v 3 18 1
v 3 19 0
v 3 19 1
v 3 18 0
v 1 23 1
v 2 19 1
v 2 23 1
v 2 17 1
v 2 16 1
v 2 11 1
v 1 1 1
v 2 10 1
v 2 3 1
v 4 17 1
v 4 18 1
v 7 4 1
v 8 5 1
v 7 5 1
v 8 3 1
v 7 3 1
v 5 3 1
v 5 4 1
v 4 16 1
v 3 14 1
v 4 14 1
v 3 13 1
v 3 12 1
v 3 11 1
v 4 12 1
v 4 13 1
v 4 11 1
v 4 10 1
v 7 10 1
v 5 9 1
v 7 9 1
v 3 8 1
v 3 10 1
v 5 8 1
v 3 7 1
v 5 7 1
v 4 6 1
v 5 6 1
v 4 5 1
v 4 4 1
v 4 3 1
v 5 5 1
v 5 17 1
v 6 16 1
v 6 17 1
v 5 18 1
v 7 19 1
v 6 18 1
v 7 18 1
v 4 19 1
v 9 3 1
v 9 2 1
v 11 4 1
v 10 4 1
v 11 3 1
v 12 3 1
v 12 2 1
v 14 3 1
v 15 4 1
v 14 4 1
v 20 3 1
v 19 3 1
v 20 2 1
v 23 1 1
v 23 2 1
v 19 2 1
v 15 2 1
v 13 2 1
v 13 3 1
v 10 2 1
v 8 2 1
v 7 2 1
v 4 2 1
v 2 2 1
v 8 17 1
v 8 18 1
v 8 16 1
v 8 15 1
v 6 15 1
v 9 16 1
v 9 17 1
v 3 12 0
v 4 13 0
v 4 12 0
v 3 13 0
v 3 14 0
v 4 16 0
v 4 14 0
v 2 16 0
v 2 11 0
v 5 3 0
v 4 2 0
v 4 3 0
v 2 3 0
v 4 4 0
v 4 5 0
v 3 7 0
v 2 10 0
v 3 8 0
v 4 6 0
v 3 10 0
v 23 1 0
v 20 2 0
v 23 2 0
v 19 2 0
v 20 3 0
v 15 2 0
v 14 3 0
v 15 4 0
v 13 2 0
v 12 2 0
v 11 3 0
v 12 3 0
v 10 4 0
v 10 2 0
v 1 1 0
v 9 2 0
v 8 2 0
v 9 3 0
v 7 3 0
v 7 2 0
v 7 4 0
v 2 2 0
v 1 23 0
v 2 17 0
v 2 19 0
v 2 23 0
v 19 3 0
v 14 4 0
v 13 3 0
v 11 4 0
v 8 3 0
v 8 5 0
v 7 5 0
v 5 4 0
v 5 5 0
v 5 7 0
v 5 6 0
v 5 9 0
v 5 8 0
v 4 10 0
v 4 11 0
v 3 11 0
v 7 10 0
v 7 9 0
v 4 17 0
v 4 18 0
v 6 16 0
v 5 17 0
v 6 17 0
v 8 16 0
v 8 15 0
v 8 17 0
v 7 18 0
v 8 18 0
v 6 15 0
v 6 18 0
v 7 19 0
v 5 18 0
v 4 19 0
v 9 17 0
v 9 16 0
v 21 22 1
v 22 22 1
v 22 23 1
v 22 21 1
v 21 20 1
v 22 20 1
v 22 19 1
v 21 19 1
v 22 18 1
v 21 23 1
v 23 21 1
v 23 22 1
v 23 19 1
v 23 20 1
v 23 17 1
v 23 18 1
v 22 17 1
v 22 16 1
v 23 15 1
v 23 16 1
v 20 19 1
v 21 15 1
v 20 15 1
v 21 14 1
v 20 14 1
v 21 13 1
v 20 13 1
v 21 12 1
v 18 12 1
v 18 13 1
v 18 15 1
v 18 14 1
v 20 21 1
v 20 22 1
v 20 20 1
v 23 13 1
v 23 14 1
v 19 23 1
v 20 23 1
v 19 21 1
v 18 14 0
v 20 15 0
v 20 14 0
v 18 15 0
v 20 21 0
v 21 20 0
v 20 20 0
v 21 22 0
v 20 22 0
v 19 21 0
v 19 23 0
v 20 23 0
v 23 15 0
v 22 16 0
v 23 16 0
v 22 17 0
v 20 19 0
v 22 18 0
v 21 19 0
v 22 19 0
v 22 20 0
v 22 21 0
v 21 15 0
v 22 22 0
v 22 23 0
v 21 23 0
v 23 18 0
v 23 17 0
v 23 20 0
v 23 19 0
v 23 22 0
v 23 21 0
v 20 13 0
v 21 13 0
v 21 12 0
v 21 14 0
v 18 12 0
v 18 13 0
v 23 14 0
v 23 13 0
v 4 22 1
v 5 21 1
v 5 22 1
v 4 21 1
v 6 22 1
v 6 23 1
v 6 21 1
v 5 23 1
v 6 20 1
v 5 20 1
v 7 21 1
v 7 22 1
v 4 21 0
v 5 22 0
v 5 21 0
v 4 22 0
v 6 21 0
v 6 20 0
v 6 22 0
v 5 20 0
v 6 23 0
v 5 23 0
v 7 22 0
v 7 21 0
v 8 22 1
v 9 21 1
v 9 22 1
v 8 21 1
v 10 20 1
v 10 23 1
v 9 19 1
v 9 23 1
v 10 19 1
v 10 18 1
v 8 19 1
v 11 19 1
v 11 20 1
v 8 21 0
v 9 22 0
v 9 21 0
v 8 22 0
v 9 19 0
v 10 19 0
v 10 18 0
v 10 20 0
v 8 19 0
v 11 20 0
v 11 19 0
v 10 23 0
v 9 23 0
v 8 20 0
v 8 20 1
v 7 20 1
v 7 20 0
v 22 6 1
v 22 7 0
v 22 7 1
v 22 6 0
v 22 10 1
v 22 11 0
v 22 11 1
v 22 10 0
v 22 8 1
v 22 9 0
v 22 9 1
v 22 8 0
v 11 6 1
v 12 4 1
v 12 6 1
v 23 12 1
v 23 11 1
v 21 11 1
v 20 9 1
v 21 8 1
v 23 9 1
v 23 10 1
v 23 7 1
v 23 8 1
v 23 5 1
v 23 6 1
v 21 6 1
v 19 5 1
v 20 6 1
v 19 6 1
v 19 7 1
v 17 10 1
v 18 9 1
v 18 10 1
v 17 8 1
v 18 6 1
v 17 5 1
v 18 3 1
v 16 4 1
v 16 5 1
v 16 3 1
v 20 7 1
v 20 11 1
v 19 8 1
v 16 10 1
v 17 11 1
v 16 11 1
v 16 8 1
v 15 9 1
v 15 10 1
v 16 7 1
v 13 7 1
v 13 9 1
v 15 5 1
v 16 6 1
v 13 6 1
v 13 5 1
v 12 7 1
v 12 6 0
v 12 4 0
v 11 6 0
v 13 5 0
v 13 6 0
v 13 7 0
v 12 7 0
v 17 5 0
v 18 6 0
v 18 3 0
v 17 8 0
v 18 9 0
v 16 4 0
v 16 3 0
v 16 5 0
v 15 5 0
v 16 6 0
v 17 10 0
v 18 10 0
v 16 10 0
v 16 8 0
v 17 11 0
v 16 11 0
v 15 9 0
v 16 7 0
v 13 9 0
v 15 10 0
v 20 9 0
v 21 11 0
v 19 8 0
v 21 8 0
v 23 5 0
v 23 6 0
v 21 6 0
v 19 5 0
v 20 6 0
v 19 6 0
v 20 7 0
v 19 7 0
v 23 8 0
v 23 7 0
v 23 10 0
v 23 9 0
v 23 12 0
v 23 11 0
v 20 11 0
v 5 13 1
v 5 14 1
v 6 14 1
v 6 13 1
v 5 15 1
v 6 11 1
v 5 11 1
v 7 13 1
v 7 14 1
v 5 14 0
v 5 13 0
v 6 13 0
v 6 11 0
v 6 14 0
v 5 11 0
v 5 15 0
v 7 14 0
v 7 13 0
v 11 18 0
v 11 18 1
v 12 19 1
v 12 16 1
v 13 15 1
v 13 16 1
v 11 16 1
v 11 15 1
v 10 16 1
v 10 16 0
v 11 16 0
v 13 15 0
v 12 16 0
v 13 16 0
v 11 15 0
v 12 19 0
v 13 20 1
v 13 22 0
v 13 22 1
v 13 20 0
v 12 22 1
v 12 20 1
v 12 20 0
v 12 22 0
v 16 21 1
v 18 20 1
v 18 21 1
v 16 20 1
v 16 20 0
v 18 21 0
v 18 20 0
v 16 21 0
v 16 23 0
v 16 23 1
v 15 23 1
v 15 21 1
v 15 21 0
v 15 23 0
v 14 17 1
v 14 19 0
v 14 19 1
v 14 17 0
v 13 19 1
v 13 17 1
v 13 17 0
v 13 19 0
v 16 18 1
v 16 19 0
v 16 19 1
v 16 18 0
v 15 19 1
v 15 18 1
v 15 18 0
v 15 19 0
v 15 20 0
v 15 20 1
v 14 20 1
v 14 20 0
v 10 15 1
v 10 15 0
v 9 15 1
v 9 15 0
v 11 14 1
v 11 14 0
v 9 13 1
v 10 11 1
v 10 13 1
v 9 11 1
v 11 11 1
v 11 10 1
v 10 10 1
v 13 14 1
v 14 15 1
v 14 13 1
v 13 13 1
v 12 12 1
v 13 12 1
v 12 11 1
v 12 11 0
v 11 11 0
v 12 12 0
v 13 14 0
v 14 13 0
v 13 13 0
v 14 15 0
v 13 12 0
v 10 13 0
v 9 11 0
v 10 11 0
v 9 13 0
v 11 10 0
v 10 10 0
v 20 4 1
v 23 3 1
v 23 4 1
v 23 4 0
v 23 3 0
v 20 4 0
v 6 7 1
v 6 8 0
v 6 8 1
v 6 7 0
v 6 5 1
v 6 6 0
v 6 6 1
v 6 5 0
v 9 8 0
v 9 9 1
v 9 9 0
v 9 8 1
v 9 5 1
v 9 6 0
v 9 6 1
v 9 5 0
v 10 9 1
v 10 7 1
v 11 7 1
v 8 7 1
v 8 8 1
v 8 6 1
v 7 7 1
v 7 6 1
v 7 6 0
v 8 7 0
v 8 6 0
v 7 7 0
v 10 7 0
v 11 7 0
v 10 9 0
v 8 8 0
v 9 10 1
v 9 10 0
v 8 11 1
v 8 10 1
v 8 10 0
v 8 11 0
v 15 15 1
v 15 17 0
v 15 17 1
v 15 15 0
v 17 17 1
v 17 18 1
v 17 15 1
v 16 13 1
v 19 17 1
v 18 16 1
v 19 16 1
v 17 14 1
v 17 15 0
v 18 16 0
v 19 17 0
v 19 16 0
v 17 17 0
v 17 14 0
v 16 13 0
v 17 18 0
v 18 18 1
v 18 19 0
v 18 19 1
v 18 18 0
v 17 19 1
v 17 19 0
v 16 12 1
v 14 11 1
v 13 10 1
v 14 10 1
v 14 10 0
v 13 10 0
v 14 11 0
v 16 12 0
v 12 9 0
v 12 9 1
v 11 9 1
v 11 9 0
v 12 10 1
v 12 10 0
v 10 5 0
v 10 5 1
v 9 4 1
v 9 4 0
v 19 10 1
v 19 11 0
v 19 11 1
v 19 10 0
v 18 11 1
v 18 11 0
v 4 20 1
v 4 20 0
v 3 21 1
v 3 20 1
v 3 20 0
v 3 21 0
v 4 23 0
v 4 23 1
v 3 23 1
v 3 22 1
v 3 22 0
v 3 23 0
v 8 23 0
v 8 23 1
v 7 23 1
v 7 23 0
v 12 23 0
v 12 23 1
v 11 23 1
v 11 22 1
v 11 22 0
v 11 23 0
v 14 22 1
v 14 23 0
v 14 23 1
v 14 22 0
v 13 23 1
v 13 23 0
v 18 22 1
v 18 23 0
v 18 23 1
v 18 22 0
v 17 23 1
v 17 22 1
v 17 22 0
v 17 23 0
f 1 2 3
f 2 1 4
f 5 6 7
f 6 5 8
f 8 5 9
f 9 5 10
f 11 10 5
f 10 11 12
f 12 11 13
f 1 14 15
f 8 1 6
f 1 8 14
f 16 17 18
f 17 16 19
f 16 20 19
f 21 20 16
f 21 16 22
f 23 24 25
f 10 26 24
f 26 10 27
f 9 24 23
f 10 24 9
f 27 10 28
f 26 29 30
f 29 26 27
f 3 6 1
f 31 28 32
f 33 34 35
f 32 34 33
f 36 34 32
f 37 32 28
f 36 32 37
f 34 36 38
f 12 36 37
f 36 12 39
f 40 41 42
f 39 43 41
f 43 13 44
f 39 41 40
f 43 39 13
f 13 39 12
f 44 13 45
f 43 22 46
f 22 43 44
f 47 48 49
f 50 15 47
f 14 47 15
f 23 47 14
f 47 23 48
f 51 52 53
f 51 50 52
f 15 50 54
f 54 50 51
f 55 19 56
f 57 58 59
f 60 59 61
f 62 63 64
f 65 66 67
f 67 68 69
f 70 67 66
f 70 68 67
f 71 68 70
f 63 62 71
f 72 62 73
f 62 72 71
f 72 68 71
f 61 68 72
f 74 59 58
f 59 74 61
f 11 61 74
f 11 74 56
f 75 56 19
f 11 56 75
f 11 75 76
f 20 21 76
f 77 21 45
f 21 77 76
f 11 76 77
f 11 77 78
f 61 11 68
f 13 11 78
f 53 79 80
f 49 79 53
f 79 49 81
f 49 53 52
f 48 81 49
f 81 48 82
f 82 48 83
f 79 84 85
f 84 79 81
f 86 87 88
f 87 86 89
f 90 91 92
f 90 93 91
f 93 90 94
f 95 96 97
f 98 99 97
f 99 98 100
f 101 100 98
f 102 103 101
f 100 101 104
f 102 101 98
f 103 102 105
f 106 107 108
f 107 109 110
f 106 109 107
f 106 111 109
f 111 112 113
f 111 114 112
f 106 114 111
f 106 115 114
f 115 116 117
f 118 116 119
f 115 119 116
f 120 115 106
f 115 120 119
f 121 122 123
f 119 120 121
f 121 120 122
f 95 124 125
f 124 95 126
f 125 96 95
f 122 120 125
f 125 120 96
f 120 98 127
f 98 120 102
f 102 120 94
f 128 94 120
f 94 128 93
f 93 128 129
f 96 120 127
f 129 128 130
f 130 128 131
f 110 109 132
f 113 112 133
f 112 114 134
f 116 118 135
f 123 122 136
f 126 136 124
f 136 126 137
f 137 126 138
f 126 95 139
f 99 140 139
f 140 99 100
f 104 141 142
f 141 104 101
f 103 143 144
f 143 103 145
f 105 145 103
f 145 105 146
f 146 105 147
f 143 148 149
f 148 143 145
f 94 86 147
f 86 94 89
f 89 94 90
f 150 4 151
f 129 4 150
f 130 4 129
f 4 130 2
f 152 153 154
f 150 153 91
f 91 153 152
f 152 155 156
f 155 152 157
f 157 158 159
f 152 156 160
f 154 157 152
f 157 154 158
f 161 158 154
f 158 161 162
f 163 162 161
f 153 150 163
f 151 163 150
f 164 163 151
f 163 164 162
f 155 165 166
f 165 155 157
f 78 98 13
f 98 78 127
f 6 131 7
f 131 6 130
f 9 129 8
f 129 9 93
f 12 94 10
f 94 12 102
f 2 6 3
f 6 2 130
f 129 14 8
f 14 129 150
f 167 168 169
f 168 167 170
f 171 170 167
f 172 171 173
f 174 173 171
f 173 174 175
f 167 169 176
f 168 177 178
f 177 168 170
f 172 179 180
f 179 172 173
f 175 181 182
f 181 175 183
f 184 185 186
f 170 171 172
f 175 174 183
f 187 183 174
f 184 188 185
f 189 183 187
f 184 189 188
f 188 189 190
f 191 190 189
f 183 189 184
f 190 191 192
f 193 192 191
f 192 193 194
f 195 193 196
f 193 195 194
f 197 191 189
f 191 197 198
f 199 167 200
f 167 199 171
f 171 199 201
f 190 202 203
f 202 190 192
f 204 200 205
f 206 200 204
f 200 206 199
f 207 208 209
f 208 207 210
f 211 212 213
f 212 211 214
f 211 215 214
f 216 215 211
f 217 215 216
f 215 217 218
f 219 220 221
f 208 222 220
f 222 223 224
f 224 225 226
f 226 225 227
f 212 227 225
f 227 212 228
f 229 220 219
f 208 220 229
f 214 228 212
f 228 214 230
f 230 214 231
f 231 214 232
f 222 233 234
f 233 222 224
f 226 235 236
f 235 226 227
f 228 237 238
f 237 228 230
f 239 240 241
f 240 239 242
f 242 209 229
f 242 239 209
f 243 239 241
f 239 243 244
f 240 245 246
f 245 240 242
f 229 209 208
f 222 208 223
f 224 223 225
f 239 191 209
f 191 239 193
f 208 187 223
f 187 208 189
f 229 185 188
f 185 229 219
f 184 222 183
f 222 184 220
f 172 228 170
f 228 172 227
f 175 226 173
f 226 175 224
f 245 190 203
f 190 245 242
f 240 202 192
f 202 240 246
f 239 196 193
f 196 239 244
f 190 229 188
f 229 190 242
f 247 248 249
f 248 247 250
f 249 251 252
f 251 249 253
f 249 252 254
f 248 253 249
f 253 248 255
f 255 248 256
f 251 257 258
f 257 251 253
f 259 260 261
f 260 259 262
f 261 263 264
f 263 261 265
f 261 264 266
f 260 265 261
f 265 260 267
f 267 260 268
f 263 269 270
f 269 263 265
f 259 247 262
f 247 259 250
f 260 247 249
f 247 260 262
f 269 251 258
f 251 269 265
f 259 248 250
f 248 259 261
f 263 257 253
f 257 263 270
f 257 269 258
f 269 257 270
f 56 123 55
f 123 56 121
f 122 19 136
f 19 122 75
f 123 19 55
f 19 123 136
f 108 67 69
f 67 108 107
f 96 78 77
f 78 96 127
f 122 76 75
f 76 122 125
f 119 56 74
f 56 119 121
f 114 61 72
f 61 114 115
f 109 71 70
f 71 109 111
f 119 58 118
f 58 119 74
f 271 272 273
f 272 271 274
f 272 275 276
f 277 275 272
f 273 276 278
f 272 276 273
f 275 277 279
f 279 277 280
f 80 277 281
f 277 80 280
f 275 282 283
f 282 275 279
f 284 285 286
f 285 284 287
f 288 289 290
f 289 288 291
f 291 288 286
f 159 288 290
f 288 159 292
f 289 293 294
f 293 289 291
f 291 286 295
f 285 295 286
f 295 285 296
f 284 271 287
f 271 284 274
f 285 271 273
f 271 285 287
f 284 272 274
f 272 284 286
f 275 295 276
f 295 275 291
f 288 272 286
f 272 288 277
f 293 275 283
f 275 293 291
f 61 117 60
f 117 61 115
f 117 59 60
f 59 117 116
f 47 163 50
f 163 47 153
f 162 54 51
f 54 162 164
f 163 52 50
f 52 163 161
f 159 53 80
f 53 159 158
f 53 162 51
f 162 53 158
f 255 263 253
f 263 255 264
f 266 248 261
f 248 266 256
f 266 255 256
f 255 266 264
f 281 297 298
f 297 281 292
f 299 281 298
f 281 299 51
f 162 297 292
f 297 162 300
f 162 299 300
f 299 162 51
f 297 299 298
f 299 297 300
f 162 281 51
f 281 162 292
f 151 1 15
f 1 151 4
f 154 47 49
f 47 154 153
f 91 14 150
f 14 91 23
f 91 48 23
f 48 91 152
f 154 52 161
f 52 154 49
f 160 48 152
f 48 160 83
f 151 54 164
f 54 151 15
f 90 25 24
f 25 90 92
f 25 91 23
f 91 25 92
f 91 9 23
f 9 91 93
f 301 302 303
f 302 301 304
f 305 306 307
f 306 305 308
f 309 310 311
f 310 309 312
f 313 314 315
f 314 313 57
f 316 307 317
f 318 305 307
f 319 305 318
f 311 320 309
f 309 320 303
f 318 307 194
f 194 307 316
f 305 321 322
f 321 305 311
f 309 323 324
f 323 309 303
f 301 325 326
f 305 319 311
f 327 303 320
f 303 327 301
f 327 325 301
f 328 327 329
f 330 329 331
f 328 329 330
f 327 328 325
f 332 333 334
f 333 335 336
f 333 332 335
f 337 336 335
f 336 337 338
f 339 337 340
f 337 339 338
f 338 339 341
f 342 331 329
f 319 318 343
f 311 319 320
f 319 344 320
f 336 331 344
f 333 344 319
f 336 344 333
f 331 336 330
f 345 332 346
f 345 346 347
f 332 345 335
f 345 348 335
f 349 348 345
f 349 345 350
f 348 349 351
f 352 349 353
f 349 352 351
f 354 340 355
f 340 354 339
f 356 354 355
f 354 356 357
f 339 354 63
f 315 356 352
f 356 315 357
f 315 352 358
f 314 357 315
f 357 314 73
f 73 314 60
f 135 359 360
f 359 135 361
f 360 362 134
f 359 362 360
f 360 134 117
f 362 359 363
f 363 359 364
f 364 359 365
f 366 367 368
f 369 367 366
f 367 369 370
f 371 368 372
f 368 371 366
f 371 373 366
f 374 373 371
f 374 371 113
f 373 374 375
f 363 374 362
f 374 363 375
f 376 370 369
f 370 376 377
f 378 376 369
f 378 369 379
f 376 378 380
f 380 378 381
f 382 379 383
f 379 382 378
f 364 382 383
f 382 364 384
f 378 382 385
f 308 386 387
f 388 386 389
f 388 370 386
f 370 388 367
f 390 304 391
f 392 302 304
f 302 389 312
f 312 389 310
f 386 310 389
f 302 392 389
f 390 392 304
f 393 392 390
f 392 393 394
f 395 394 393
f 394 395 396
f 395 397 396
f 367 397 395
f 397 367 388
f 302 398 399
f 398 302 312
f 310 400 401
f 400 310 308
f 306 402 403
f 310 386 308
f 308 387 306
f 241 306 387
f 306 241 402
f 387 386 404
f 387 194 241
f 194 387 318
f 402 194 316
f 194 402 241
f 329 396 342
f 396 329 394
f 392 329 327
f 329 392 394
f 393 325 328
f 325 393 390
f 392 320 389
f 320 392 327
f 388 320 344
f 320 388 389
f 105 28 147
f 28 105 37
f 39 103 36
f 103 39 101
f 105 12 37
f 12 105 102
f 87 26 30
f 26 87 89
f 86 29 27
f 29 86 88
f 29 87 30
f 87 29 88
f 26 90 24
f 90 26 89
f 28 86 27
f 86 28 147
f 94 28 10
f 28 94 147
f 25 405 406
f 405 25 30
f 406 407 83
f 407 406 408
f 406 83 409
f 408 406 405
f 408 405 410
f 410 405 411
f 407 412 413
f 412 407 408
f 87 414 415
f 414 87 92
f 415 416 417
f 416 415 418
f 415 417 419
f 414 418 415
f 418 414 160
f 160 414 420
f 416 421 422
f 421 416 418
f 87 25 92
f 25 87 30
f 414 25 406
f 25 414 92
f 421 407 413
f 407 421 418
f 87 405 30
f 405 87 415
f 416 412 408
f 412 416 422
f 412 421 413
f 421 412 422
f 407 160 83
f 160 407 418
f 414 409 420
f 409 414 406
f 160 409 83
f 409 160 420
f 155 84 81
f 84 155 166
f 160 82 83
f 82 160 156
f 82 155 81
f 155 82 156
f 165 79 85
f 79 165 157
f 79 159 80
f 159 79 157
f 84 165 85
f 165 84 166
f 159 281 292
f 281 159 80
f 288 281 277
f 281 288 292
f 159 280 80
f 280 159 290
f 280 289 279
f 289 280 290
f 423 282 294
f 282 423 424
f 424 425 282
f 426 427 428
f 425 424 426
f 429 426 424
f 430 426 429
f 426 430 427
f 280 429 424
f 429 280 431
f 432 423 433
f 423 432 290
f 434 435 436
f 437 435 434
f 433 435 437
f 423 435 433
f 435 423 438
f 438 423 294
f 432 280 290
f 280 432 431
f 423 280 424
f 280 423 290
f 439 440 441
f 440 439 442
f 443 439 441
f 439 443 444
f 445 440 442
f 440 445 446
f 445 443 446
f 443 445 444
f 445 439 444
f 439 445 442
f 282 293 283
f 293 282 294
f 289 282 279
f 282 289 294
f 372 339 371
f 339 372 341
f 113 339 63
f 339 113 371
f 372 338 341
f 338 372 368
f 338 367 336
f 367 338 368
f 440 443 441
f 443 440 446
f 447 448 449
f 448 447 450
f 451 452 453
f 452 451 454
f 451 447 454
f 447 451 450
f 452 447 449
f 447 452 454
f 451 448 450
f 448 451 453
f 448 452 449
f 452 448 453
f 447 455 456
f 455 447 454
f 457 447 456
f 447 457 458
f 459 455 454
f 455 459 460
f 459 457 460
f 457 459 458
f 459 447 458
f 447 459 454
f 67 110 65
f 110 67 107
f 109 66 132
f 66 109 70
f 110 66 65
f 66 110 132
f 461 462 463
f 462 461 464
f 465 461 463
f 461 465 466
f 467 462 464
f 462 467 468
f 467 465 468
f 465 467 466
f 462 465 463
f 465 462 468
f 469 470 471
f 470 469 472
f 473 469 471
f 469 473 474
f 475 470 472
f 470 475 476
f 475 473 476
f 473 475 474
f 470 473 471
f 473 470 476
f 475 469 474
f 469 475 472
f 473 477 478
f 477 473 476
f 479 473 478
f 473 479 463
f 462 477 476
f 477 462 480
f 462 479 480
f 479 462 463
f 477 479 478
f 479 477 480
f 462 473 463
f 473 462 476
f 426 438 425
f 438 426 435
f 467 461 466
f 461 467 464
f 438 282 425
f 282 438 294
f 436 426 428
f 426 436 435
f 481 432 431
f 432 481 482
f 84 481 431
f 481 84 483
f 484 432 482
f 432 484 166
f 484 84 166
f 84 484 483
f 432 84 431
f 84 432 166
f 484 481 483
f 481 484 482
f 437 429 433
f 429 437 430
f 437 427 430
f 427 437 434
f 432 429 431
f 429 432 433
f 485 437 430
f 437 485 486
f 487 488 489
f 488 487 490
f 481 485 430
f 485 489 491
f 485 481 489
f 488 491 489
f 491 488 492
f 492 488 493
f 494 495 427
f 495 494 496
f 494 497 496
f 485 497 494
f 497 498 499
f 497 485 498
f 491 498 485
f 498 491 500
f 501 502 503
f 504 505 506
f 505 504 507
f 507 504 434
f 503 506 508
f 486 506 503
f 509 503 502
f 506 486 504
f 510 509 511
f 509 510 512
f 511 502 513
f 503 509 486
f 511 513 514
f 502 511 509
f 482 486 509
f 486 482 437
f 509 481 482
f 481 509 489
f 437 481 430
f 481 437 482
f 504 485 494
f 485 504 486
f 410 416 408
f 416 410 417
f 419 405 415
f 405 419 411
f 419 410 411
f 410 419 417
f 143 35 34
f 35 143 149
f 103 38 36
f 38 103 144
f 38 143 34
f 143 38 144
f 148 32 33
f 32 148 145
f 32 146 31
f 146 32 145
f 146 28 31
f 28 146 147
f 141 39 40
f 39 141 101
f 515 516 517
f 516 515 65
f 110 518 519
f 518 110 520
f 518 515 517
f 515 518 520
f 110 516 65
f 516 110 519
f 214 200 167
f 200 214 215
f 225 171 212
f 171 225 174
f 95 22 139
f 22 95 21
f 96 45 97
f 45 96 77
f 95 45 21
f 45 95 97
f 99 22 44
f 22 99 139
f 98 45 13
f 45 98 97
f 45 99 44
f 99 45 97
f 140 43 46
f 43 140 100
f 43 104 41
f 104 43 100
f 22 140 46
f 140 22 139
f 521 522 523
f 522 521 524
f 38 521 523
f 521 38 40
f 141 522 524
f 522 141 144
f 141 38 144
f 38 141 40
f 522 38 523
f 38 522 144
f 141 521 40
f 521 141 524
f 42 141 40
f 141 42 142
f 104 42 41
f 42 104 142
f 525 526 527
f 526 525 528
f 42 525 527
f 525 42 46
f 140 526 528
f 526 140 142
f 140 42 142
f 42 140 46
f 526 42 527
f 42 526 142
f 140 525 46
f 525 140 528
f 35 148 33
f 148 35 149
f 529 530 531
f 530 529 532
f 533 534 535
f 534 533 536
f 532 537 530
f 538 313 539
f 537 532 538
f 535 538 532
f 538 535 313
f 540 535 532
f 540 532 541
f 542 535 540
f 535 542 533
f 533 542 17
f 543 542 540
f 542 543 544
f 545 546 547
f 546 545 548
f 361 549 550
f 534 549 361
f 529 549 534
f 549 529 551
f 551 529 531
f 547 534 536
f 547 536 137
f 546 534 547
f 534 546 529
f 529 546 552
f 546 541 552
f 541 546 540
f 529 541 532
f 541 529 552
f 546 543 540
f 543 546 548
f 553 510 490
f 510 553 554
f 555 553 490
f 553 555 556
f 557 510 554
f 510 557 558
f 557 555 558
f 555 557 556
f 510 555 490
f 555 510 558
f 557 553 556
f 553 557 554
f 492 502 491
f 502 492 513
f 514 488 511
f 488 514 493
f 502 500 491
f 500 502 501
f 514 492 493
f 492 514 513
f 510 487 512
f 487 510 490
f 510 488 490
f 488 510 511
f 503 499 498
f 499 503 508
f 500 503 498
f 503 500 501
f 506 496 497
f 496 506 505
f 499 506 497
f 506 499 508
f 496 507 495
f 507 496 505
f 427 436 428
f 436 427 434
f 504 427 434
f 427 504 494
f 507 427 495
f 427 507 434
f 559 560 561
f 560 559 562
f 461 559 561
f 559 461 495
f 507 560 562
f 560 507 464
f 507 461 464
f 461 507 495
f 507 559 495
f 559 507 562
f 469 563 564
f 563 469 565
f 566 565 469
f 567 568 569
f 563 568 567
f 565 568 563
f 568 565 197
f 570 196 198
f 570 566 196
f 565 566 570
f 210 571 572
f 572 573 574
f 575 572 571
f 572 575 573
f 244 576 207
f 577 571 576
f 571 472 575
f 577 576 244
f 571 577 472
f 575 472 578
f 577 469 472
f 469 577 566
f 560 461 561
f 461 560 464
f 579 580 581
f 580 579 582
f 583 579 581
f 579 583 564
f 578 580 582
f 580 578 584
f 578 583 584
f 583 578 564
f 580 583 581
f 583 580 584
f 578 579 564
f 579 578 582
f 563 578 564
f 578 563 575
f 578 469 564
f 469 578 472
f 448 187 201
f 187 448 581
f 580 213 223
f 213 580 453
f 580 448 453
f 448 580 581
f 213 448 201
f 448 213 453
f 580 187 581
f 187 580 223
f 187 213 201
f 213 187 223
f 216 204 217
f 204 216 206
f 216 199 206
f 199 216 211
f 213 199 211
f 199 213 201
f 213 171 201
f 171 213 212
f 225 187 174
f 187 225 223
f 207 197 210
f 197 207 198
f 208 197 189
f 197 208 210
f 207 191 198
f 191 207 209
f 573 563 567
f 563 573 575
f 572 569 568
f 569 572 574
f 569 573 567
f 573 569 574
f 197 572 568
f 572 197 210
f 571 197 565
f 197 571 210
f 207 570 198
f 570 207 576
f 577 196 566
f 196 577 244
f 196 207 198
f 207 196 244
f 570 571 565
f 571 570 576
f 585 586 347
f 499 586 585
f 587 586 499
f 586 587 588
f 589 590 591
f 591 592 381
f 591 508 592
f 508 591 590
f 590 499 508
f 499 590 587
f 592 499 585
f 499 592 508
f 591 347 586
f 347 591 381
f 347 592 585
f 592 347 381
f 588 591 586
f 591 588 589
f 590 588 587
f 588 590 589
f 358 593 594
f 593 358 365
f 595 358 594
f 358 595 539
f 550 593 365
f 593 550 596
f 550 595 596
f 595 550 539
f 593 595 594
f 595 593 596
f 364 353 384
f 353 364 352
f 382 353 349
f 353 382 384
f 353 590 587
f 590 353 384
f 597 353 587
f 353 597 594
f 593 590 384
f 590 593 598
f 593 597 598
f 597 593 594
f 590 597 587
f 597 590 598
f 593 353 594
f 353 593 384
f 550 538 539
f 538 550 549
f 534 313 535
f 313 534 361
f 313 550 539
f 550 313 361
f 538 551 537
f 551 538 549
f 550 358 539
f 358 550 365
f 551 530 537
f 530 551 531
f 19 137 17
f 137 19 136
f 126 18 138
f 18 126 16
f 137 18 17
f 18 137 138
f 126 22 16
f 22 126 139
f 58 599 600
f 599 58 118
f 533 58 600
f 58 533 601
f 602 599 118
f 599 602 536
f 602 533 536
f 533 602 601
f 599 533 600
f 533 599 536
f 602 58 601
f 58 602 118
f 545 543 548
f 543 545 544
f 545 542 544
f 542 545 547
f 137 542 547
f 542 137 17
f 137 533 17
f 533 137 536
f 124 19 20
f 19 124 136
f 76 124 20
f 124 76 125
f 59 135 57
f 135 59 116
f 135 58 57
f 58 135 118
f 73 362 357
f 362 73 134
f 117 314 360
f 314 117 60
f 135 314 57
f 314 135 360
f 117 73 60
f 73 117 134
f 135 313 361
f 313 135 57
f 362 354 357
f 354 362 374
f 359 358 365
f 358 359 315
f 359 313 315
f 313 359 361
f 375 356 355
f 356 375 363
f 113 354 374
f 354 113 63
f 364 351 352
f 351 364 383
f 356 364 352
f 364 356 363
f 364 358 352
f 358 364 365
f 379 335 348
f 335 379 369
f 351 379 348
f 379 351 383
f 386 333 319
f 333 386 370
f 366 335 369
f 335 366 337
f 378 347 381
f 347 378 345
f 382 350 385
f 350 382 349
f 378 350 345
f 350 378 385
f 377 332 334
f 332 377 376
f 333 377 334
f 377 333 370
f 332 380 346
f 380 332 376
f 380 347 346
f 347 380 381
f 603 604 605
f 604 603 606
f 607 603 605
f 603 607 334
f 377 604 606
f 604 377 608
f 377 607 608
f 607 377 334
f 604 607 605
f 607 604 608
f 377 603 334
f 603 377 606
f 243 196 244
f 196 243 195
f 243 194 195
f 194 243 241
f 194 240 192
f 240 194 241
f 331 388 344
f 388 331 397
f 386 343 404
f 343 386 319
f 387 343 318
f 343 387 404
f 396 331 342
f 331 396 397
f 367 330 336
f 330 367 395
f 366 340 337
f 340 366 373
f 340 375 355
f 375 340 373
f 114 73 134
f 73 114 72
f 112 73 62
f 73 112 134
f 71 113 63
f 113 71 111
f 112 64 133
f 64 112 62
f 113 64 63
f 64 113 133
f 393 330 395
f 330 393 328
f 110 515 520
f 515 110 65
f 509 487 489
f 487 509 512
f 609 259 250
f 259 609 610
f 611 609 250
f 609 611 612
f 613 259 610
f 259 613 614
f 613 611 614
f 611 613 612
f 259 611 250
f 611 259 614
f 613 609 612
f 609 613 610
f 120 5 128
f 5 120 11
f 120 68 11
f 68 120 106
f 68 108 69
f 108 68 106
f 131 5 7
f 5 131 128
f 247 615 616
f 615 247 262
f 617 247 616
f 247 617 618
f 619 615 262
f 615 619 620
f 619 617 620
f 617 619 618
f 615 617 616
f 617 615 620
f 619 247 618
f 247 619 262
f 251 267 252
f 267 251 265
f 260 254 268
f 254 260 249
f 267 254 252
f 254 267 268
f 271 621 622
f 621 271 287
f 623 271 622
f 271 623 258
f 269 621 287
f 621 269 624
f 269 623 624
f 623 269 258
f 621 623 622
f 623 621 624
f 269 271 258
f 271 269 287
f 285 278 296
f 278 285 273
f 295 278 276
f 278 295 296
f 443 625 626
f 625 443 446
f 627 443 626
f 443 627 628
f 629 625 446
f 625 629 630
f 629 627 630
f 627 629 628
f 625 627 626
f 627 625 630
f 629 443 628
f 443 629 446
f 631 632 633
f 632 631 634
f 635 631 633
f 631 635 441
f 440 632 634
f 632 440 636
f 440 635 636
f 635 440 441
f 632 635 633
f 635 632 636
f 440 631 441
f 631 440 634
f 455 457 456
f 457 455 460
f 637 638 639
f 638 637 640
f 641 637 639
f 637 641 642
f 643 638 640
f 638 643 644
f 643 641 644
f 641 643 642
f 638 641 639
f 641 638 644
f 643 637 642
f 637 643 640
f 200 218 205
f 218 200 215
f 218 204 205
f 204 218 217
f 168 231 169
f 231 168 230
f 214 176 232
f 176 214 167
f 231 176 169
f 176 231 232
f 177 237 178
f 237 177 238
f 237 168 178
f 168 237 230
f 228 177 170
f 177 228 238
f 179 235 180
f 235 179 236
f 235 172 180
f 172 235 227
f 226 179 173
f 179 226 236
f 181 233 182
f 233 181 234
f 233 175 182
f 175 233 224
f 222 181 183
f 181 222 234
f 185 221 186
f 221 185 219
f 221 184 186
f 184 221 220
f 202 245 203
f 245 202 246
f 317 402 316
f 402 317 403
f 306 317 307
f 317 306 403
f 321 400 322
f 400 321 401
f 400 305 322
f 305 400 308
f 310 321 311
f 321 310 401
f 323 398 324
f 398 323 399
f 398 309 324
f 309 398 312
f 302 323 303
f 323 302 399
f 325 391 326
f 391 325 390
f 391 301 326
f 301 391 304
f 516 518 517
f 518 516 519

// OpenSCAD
// file: ../../util/bitmap.scad
/*****************************************************************************
 * Module Bitmap Library
 * Modules to create bitmaps of unit squares from 1 or 2 dimensional vectors.
 *****************************************************************************
 * Copyright 2017 Chris Baker
 *
 * This program is free software: you can redistribute it and/or modify
 * it under the terms of the GNU Lesser General Public License as published by
 * the Free Software Foundation, either version 3 of the License, or
 * (at your option) any later version.
 *
 * This program is distributed in the hope that it will be useful,
 * but WITHOUT ANY WARRANTY; without even the implied warranty of
 * MERCHANTABILITY or FITNESS FOR A PARTICULAR PURPOSE.  See the
 * GNU Lesser General Public License for more details.
 *
 * You should have received a copy of the GNU Lesser General Public License
 * along with this program.  If not, see <http://www.gnu.org/licenses/>.
 *****************************************************************************
 * Usage:
 * Include this file with the "use" tag.
 * Depends on compat.scad library.
 *
 * API:
 *   1dbitmap(bitmap, center, expansion, vector_mode)
 *   2dbitmap(bitmap, center, expansion, vector_mode)
 *     Generate a 1 or 2-Dimensional field of modules based on the provided
 *     bitmap vector. See Bitmap Vectors below.
 *     The center flag determines whether to center the bitmap on the origin.
 *     The expansion value actually shrinks each cube in the x and y
 *     dimension by the specified amount.
 *     The vector_mode flag determines whether to create 3D solid geometry
 *     (unit cubes) or 2D vector geometry (squares).
 *
 * Bitmap Vectors:
 *   The bitmap vectors primarily provide boolean information.
 *   A module will be placed where these vectors have a postive value and
 *   skipped where they have a negative value. I.E. 0, -1, false, and undef
 *   are all equivalent and result in a skip. 1 and true are equivalent and
 *   result in a placed 1-unit module.
 *   Further, if the value is an integer it will be treated as a height for
 *   the module, allowing z-maps to be created.
 *   If the value is not an integer or boolean, it will be treated as a color
 *   reference. This can be a string or RGBA vector that will be used to
 *   color the module in the OpenSCAD preview window.
 *   In current versions of OpenSCAD, the color has no effect in the rendered
 *   view or STL output.
 *
 * Vector Mode:
 *   Although OpenSCAD supports generating 2D geometry, there are several
 *   caveats:
 *   - 2D and 3D geometry cannot be mixed
 *   - Extruding 2D geometry causes color information to be lost
 *   - All 2D geometry is projected onto the XY plane when rendering
 *   - Rendering also results in loss of color (same as 3D)
 *   - The SVG exporter is somewhat limited:
 *     - The pixel size of the image is hard-coded in the file
 *     - The title of the image is a generic string
 *     - The color selection for stroke and fill is fixed
 *     - The stroke-width is set to a large value that will cause overlap
 *     - The background is transparent
 *     - Only one path element is created with all of the geometry; there is
 *       no easy way to split up the geometry into multiple logical units.
 *     - These issues can mostly be resolved by hand-editing the file:
 *       - Remove or modify the width and height parameters from the svg
 *         element at the top of the file to provide better scaling.
 *       - Edit the title element at the top of the file to change the title.
 *       - Edit the stroke and fill parameters of the path element (these will
 *         probably be at the end of the file).
 *       - Set the stroke-width parameter for the path element to 0.
 *****************************************************************************/
use <compat.scad>

/*
 * 2dbitmap - Turn a 2D vector into a bitmap of cubes
 *
 * bitmap - 2D vector representing where to place each cube
 *          Value can either be boolean, z-height, or color
 * center - center cubes around the origin
 * expansion - size of gap around each pixel (screendoor)
 * vector_mode - create a 2D vector drawing instead of 3D extrusion
 */
module 2dbitmap(bitmap=[[1,0],[0,1]], center=false, expansion=0, vector_mode=false)
{
	ylen=len(bitmap)-1;

	for (y=[0:ylen]) {
		xlen=len(bitmap[y])-1;
		for (x=[0:xlen])
			translate([x-(center?xlen/2:0),ylen-y-(center?ylen/2:0),0])
				if (is_indexable(bitmap[y][x]))
					color(bitmap[y][x])
						if (vector_mode)
							square([1-expansion,1-expansion], center=center);
						else
							cube([1-expansion,1-expansion,1], center=center);
				else
					if (bitmap[y][x])
						if (vector_mode)
							square([1-expansion,1-expansion], center=center);
						else
							cube([1-expansion,1-expansion,clamp_nonnum(bitmap[y][x])], center=center);
	}
}

module 1dbitmap(bitmap=[1,0,1,0,1], center=false, expansion=0, vector_mode=false)
	2dbitmap([bitmap], center, expansion, vector_mode);

/*
 * Examples
 */

// 1D with z-height
translate([10,0,0]) scale([1,10,1])
	1dbitmap(bitmap=[1,1,0,2,0,0,3], expansion=.1);

// 1D with boolean
translate([-20,0,0]) scale([1,10,1])
	1dbitmap(bitmap=[true,false,true,false,true,true]);

// 2D with z-height
scale([2,2,1])
	2dbitmap(bitmap=[[1,0,2,1],[0,3,3,0],[1,1,0,1]],
		center=true);

// 1D with color
translate([0,-10,0]) scale([1,3,1])
	1dbitmap(bitmap=["red","white","blue",[0,0.3,0,0.5]]);

// 1D with color using 2D-vector-mode
translate([-7,-8,0]) scale([1,2])
	1dbitmap(bitmap=["red",0,"blue",0,"green"], vector_mode=true);
translate([-4.5,-10,0]) scale([1,2])
	1dbitmap(bitmap=["red",0,"blue",0,"green"], vector_mode=true, center=true);
// file: ../../util/bitlib.scad
/*****************************************************************************
 * Bit Manipulation Library
 * Provides some useful bit manipulation functions.
 *****************************************************************************
 * Copyright 2017 Chris Baker
 *
 * This program is free software: you can redistribute it and/or modify
 * it under the terms of the GNU Lesser General Public License as published by
 * the Free Software Foundation, either version 3 of the License, or
 * (at your option) any later version.
 *
 * This program is distributed in the hope that it will be useful,
 * but WITHOUT ANY WARRANTY; without even the implied warranty of
 * MERCHANTABILITY or FITNESS FOR A PARTICULAR PURPOSE.  See the
 * GNU Lesser General Public License for more details.
 *
 * You should have received a copy of the GNU Lesser General Public License
 * along with this program.  If not, see <http://www.gnu.org/licenses/>.
 *****************************************************************************
 * Usage:
 * Include this file with the "use" tag.
 * When run on its own, all echo statements in this
 * library should print "true".
 *
 * API:
 *   bit(v,b)
 *     Return the truth value of the b'th bit of v.
 *
 *   check_bit_size(v,b,signed=false)
 *     Determine whether the value v can be represented
 *     with b bits (b must be positive).
 *     The signed flag indicates whether to include the
 *     sign bit in the determination; otherwise negative
 *     values will result in undef being returned.
 *
 *   xor(a,b)
 *     Return the value of a xor b.
 *     Handles arbitrary size values for a and b.
 *     Handles negative values as expected (a positive
 *     result will be returned unless a and b have
 *     differing signs).
 *
 * TODO:
 *  - Change echos to asserts (future OpenSCAD version)
 *  - Add more functions
 *
 *****************************************************************************/

//Return the truth value of the b'th bit of v
function bit(v,b) =
	((v==undef)||(b==undef)||(b<0))?undef:
	(floor(v / pow(2, b)) % 2)?true:false;

echo("*** bit() testcases ***");
echo(0,bit(0,0)==false);
echo(1,bit(-1,0)==true);
echo(2,bit(1,0)==true);
echo(3,[for (i=[0:63]) bit(0,i)]==[for (i=[0:63]) false]); //0=0...0
echo(4,[for (i=[0:63]) bit(-1,i)]==[for (i=[0:63]) true]); //-1=1...1
echo(5,[for (i=[1:63]) bit(1,i)]==[for (i=[1:63]) false]); //1=0...01
echo(6,[for (i=[0:7]) bit(85,i)?1:0]==[1,0,1,0,1,0,1,0]); //85=01010101
echo(7,[for (i=[0:7]) bit(170,i)?1:0]==[0,1,0,1,0,1,0,1]); //170=10101010
echo(8,[for (i=[0:7]) bit(165,i)?1:0]==[1,0,1,0,0,1,0,1]); //165=10100101
echo(9,[for (i=[0:7]) bit(56,i)?1:0]==[0,0,0,1,1,1,0,0]); //56=00111000
echo(10,[for (i=[0:7]) bit(-3,i)?1:0]==[1,0,1,1,1,1,1,1]); //-3=1...101
//(2^64)=0...01 0...0
echo(11,bit(pow(2,64),64)==true);
echo(12,[for (i=[0:63]) bit(pow(2,64),i)]==[for (i=[0:63]) false]);
echo(13,[for (i=[65:127]) bit(pow(2,64),i)]==[for (i=[1:63]) false]);
//-(2^64)=1...1 0...0
echo(14,[for (i=[0:63]) bit(-pow(2,64),i)]==[for (i=[0:63]) false]);
echo(15,[for (i=[64:127]) bit(-pow(2,64),i)]==[for (i=[0:63]) true]);
echo(16,bit(10,-1)==undef);
echo(17,bit(10,undef)==undef);
echo(18,bit(undef,3)==undef);

//return true if v can be represented in b bits
//if signed flag is set. the result will be adjusted
//to account for the needed sign bit
function check_bit_size(v,b,signed=false) =
	(b<0)?undef:
	(v==undef)?undef:
	(b==0)?false:
	(v==0)?true: //(b>0)
	(signed)?
		(v<0)?(-pow(2,b-1)<(v+1)):
			(pow(2,b-1)>(v+1)):
		(v<0)?undef:
			(pow(2,b)>v);

echo("*** check_bit_size() testcases ***");
echo(0,check_bit_size(-1,2)==undef);
echo(1,check_bit_size(2,-4)==undef);
echo(2,check_bit_size(2,-4,signed=true)==undef);
echo(3,check_bit_size(0,0)==false);
echo(4,check_bit_size(0,1)==true);
echo(5,check_bit_size(1,0)==false);
echo(6,check_bit_size(1,1)==true);
echo(7,check_bit_size(7,3)==true);
echo(8,check_bit_size(8,3)==false);
echo(9,check_bit_size(1,3)==true);
echo(10,check_bit_size(256,8)==false);
echo(11,check_bit_size(255,8)==true);
echo(12,check_bit_size(10,2)==false);
echo(13,check_bit_size(10,4)==true);
echo(14,check_bit_size(-10,2,signed=true)==false);
echo(15,check_bit_size(-10,4,signed=true)==false);
echo(16,check_bit_size(-10,5,signed=true)==true);
echo(17,check_bit_size(-1,0,signed=true)==false);
echo(18,check_bit_size(-1,1,signed=true)==true);
echo(19,check_bit_size(0,0,signed=true)==false);
echo(20,check_bit_size(0,1,signed=true)==true);
echo(21,check_bit_size(-2,2,signed=true)==true);
echo(22,check_bit_size(-3,2,signed=true)==false);
echo(23,check_bit_size(-3,3,signed=true)==true);
echo(24,check_bit_size(-8,3,signed=true)==false);
echo(25,check_bit_size(-8,4,signed=true)==true);
echo(26,check_bit_size(undef,4)==undef);
echo(27,check_bit_size(undef,4,signed=true)==undef);

//return the value of a xor b
//runs recursively until all bits of a and b are exhausted
function xor(a,b,i=0) =
	((a==undef)||(b==undef))?undef:
	let (c=bit(a,i), d=bit(b,i),
		 v=((c||d) && !(c&&d))?pow(2,i):0)
		(check_bit_size(a,i,signed=true) &&
		 check_bit_size(b,i,signed=true))?
			-v: //special case for sign bit
			v+xor(a,b,i+1); //recursively add powers of 2

echo("*** xor() testcases ***");
echo(0,xor(42,0)==42);
echo(1,xor(42,42)==0);
echo(2,xor(169,238)==71); //10101001^11101110=01000111=71
echo(3,xor(238,169)==71);
echo(4,xor(42,238)==196); //00101010^11101110=11000100=196
echo(5,xor(169,42)==131); //10101001^00101010=10000011=131
echo(6,xor(-8,-10)==14); //11000^10110=01110=14
echo(7,xor(-7,-10)==15); //11001^10110=01111=15
echo(8,xor(9,-10)==-1); //01001^10110=11111=-1
echo(9,xor(9,-12)==-3); //01001^10100=11101=-3
echo(10,xor(undef,0)==undef);
// file: ../../util/stringlib.scad
/*****************************************************************************
 * String Manipulation Library
 * Provides some useful string manipulation functions.
 *****************************************************************************
 * Copyright 2017 Chris Baker
 *
 * This program is free software: you can redistribute it and/or modify
 * it under the terms of the GNU Lesser General Public License as published by
 * the Free Software Foundation, either version 3 of the License, or
 * (at your option) any later version.
 *
 * This program is distributed in the hope that it will be useful,
 * but WITHOUT ANY WARRANTY; without even the implied warranty of
 * MERCHANTABILITY or FITNESS FOR A PARTICULAR PURPOSE.  See the
 * GNU Lesser General Public License for more details.
 *
 * You should have received a copy of the GNU Lesser General Public License
 * along with this program.  If not, see <http://www.gnu.org/licenses/>.
 *****************************************************************************
 * Usage:
 * Include this file with the "use" tag.
 * When run on its own, all echo statements in this library should print
 * "true".
 *
 * API:
 *   atoi(a)
 *     Convert the string of numerals, a, to a vector of individual decimal
 *     numbers.
 *
 *   ascii_to_vec(a)
 *     Convert the ASCII string, a, into a vector of decimal numbers.
 *
 * TODO:
 *  - Change echos to asserts (future OpenSCAD version)
 *
 *****************************************************************************/

/*
 * atoi - convert ASCII numerals to a vector of individual decimal numbers
 *
 * a - the ASCII string of numerals
 */
function atoi(a) = (len(a)==undef)?undef:
[
	let (val = search(a, "0123456789"))
		for (i = val) i
];

echo("*** atoi() testcases ***");
echo(ascii_to_vec(undef)==undef);
echo(ascii_to_vec(true)==undef);
echo(ascii_to_vec(false)==undef);
echo(ascii_to_vec("")==[]);
echo(atoi("0")==[0]);
echo(atoi("1")==[1]);
echo(atoi("2")==[2]);
echo(atoi("3")==[3]);
echo(atoi("4")==[4]);
echo(atoi("5")==[5]);
echo(atoi("6")==[6]);
echo(atoi("7")==[7]);
echo(atoi("8")==[8]);
echo(atoi("9")==[9]);
echo(atoi("123")==[1,2,3]);
echo(atoi("1a23b")==[1,2,3]); //degenerate case, don't really care too much about the result

/*
 * ascii_to_vec - convert ASCII string to decimal vector
 *
 * a - the ASCII string to vectorize
 */
function ascii_to_vec(a) = (len(a)==undef)?undef:
[
	let (val = search(a, "\x01\x02\x03\x04\x05\x06\x07\x08\x09\x0a\x0b\x0c\x0d\x0e\x0f\x10\x11\x12\x13\x14\x15\x16\x17\x18\x19\x1a\x1b\x1c\x1d\x1e\x1f !\"#$%&'()*+,-./0123456789:;<=>?@ABCDEFGHIJKLMNOPQRSTUVWXYZ[\\]^_`abcdefghijklmnopqrstuvwxyz{|}~\x7f"))
		for (i = val) i+1
];

echo("*** ascii_to_vec() testcases ***");
echo(ascii_to_vec(undef)==undef);
echo(ascii_to_vec(true)==undef);
echo(ascii_to_vec(false)==undef);
echo(ascii_to_vec("")==[]);
echo(ascii_to_vec("0")==[48]);
echo(ascii_to_vec("a")==[97]);
echo(ascii_to_vec("0123456789")==[48,49,50,51,52,53,54,55,56,57]);
echo(ascii_to_vec("The quick brown fox jumped over the lazy dog.")
	==[84,104,101,32,113,117,105,99,107,32,98,114,111,119,110,32,102,111,120,32,106,117,109,112,101,100,32,111,118,101,114,32,116,104,101,32,108,97,122,121,32,100,111,103,46]);
// main file
/* Unit Test 09: 22x22 - 30 data bytes, 20 ecc bytes - text mode */
/* From Wikipedia */
use <../datamatrix.scad>
data_matrix(
	concat(
		text_mode(),
		dm_text("Wikipedia, the free encyclopedi"),
		ascii_mode(),
		dm_ascii("a")
	),
	mark="black");
